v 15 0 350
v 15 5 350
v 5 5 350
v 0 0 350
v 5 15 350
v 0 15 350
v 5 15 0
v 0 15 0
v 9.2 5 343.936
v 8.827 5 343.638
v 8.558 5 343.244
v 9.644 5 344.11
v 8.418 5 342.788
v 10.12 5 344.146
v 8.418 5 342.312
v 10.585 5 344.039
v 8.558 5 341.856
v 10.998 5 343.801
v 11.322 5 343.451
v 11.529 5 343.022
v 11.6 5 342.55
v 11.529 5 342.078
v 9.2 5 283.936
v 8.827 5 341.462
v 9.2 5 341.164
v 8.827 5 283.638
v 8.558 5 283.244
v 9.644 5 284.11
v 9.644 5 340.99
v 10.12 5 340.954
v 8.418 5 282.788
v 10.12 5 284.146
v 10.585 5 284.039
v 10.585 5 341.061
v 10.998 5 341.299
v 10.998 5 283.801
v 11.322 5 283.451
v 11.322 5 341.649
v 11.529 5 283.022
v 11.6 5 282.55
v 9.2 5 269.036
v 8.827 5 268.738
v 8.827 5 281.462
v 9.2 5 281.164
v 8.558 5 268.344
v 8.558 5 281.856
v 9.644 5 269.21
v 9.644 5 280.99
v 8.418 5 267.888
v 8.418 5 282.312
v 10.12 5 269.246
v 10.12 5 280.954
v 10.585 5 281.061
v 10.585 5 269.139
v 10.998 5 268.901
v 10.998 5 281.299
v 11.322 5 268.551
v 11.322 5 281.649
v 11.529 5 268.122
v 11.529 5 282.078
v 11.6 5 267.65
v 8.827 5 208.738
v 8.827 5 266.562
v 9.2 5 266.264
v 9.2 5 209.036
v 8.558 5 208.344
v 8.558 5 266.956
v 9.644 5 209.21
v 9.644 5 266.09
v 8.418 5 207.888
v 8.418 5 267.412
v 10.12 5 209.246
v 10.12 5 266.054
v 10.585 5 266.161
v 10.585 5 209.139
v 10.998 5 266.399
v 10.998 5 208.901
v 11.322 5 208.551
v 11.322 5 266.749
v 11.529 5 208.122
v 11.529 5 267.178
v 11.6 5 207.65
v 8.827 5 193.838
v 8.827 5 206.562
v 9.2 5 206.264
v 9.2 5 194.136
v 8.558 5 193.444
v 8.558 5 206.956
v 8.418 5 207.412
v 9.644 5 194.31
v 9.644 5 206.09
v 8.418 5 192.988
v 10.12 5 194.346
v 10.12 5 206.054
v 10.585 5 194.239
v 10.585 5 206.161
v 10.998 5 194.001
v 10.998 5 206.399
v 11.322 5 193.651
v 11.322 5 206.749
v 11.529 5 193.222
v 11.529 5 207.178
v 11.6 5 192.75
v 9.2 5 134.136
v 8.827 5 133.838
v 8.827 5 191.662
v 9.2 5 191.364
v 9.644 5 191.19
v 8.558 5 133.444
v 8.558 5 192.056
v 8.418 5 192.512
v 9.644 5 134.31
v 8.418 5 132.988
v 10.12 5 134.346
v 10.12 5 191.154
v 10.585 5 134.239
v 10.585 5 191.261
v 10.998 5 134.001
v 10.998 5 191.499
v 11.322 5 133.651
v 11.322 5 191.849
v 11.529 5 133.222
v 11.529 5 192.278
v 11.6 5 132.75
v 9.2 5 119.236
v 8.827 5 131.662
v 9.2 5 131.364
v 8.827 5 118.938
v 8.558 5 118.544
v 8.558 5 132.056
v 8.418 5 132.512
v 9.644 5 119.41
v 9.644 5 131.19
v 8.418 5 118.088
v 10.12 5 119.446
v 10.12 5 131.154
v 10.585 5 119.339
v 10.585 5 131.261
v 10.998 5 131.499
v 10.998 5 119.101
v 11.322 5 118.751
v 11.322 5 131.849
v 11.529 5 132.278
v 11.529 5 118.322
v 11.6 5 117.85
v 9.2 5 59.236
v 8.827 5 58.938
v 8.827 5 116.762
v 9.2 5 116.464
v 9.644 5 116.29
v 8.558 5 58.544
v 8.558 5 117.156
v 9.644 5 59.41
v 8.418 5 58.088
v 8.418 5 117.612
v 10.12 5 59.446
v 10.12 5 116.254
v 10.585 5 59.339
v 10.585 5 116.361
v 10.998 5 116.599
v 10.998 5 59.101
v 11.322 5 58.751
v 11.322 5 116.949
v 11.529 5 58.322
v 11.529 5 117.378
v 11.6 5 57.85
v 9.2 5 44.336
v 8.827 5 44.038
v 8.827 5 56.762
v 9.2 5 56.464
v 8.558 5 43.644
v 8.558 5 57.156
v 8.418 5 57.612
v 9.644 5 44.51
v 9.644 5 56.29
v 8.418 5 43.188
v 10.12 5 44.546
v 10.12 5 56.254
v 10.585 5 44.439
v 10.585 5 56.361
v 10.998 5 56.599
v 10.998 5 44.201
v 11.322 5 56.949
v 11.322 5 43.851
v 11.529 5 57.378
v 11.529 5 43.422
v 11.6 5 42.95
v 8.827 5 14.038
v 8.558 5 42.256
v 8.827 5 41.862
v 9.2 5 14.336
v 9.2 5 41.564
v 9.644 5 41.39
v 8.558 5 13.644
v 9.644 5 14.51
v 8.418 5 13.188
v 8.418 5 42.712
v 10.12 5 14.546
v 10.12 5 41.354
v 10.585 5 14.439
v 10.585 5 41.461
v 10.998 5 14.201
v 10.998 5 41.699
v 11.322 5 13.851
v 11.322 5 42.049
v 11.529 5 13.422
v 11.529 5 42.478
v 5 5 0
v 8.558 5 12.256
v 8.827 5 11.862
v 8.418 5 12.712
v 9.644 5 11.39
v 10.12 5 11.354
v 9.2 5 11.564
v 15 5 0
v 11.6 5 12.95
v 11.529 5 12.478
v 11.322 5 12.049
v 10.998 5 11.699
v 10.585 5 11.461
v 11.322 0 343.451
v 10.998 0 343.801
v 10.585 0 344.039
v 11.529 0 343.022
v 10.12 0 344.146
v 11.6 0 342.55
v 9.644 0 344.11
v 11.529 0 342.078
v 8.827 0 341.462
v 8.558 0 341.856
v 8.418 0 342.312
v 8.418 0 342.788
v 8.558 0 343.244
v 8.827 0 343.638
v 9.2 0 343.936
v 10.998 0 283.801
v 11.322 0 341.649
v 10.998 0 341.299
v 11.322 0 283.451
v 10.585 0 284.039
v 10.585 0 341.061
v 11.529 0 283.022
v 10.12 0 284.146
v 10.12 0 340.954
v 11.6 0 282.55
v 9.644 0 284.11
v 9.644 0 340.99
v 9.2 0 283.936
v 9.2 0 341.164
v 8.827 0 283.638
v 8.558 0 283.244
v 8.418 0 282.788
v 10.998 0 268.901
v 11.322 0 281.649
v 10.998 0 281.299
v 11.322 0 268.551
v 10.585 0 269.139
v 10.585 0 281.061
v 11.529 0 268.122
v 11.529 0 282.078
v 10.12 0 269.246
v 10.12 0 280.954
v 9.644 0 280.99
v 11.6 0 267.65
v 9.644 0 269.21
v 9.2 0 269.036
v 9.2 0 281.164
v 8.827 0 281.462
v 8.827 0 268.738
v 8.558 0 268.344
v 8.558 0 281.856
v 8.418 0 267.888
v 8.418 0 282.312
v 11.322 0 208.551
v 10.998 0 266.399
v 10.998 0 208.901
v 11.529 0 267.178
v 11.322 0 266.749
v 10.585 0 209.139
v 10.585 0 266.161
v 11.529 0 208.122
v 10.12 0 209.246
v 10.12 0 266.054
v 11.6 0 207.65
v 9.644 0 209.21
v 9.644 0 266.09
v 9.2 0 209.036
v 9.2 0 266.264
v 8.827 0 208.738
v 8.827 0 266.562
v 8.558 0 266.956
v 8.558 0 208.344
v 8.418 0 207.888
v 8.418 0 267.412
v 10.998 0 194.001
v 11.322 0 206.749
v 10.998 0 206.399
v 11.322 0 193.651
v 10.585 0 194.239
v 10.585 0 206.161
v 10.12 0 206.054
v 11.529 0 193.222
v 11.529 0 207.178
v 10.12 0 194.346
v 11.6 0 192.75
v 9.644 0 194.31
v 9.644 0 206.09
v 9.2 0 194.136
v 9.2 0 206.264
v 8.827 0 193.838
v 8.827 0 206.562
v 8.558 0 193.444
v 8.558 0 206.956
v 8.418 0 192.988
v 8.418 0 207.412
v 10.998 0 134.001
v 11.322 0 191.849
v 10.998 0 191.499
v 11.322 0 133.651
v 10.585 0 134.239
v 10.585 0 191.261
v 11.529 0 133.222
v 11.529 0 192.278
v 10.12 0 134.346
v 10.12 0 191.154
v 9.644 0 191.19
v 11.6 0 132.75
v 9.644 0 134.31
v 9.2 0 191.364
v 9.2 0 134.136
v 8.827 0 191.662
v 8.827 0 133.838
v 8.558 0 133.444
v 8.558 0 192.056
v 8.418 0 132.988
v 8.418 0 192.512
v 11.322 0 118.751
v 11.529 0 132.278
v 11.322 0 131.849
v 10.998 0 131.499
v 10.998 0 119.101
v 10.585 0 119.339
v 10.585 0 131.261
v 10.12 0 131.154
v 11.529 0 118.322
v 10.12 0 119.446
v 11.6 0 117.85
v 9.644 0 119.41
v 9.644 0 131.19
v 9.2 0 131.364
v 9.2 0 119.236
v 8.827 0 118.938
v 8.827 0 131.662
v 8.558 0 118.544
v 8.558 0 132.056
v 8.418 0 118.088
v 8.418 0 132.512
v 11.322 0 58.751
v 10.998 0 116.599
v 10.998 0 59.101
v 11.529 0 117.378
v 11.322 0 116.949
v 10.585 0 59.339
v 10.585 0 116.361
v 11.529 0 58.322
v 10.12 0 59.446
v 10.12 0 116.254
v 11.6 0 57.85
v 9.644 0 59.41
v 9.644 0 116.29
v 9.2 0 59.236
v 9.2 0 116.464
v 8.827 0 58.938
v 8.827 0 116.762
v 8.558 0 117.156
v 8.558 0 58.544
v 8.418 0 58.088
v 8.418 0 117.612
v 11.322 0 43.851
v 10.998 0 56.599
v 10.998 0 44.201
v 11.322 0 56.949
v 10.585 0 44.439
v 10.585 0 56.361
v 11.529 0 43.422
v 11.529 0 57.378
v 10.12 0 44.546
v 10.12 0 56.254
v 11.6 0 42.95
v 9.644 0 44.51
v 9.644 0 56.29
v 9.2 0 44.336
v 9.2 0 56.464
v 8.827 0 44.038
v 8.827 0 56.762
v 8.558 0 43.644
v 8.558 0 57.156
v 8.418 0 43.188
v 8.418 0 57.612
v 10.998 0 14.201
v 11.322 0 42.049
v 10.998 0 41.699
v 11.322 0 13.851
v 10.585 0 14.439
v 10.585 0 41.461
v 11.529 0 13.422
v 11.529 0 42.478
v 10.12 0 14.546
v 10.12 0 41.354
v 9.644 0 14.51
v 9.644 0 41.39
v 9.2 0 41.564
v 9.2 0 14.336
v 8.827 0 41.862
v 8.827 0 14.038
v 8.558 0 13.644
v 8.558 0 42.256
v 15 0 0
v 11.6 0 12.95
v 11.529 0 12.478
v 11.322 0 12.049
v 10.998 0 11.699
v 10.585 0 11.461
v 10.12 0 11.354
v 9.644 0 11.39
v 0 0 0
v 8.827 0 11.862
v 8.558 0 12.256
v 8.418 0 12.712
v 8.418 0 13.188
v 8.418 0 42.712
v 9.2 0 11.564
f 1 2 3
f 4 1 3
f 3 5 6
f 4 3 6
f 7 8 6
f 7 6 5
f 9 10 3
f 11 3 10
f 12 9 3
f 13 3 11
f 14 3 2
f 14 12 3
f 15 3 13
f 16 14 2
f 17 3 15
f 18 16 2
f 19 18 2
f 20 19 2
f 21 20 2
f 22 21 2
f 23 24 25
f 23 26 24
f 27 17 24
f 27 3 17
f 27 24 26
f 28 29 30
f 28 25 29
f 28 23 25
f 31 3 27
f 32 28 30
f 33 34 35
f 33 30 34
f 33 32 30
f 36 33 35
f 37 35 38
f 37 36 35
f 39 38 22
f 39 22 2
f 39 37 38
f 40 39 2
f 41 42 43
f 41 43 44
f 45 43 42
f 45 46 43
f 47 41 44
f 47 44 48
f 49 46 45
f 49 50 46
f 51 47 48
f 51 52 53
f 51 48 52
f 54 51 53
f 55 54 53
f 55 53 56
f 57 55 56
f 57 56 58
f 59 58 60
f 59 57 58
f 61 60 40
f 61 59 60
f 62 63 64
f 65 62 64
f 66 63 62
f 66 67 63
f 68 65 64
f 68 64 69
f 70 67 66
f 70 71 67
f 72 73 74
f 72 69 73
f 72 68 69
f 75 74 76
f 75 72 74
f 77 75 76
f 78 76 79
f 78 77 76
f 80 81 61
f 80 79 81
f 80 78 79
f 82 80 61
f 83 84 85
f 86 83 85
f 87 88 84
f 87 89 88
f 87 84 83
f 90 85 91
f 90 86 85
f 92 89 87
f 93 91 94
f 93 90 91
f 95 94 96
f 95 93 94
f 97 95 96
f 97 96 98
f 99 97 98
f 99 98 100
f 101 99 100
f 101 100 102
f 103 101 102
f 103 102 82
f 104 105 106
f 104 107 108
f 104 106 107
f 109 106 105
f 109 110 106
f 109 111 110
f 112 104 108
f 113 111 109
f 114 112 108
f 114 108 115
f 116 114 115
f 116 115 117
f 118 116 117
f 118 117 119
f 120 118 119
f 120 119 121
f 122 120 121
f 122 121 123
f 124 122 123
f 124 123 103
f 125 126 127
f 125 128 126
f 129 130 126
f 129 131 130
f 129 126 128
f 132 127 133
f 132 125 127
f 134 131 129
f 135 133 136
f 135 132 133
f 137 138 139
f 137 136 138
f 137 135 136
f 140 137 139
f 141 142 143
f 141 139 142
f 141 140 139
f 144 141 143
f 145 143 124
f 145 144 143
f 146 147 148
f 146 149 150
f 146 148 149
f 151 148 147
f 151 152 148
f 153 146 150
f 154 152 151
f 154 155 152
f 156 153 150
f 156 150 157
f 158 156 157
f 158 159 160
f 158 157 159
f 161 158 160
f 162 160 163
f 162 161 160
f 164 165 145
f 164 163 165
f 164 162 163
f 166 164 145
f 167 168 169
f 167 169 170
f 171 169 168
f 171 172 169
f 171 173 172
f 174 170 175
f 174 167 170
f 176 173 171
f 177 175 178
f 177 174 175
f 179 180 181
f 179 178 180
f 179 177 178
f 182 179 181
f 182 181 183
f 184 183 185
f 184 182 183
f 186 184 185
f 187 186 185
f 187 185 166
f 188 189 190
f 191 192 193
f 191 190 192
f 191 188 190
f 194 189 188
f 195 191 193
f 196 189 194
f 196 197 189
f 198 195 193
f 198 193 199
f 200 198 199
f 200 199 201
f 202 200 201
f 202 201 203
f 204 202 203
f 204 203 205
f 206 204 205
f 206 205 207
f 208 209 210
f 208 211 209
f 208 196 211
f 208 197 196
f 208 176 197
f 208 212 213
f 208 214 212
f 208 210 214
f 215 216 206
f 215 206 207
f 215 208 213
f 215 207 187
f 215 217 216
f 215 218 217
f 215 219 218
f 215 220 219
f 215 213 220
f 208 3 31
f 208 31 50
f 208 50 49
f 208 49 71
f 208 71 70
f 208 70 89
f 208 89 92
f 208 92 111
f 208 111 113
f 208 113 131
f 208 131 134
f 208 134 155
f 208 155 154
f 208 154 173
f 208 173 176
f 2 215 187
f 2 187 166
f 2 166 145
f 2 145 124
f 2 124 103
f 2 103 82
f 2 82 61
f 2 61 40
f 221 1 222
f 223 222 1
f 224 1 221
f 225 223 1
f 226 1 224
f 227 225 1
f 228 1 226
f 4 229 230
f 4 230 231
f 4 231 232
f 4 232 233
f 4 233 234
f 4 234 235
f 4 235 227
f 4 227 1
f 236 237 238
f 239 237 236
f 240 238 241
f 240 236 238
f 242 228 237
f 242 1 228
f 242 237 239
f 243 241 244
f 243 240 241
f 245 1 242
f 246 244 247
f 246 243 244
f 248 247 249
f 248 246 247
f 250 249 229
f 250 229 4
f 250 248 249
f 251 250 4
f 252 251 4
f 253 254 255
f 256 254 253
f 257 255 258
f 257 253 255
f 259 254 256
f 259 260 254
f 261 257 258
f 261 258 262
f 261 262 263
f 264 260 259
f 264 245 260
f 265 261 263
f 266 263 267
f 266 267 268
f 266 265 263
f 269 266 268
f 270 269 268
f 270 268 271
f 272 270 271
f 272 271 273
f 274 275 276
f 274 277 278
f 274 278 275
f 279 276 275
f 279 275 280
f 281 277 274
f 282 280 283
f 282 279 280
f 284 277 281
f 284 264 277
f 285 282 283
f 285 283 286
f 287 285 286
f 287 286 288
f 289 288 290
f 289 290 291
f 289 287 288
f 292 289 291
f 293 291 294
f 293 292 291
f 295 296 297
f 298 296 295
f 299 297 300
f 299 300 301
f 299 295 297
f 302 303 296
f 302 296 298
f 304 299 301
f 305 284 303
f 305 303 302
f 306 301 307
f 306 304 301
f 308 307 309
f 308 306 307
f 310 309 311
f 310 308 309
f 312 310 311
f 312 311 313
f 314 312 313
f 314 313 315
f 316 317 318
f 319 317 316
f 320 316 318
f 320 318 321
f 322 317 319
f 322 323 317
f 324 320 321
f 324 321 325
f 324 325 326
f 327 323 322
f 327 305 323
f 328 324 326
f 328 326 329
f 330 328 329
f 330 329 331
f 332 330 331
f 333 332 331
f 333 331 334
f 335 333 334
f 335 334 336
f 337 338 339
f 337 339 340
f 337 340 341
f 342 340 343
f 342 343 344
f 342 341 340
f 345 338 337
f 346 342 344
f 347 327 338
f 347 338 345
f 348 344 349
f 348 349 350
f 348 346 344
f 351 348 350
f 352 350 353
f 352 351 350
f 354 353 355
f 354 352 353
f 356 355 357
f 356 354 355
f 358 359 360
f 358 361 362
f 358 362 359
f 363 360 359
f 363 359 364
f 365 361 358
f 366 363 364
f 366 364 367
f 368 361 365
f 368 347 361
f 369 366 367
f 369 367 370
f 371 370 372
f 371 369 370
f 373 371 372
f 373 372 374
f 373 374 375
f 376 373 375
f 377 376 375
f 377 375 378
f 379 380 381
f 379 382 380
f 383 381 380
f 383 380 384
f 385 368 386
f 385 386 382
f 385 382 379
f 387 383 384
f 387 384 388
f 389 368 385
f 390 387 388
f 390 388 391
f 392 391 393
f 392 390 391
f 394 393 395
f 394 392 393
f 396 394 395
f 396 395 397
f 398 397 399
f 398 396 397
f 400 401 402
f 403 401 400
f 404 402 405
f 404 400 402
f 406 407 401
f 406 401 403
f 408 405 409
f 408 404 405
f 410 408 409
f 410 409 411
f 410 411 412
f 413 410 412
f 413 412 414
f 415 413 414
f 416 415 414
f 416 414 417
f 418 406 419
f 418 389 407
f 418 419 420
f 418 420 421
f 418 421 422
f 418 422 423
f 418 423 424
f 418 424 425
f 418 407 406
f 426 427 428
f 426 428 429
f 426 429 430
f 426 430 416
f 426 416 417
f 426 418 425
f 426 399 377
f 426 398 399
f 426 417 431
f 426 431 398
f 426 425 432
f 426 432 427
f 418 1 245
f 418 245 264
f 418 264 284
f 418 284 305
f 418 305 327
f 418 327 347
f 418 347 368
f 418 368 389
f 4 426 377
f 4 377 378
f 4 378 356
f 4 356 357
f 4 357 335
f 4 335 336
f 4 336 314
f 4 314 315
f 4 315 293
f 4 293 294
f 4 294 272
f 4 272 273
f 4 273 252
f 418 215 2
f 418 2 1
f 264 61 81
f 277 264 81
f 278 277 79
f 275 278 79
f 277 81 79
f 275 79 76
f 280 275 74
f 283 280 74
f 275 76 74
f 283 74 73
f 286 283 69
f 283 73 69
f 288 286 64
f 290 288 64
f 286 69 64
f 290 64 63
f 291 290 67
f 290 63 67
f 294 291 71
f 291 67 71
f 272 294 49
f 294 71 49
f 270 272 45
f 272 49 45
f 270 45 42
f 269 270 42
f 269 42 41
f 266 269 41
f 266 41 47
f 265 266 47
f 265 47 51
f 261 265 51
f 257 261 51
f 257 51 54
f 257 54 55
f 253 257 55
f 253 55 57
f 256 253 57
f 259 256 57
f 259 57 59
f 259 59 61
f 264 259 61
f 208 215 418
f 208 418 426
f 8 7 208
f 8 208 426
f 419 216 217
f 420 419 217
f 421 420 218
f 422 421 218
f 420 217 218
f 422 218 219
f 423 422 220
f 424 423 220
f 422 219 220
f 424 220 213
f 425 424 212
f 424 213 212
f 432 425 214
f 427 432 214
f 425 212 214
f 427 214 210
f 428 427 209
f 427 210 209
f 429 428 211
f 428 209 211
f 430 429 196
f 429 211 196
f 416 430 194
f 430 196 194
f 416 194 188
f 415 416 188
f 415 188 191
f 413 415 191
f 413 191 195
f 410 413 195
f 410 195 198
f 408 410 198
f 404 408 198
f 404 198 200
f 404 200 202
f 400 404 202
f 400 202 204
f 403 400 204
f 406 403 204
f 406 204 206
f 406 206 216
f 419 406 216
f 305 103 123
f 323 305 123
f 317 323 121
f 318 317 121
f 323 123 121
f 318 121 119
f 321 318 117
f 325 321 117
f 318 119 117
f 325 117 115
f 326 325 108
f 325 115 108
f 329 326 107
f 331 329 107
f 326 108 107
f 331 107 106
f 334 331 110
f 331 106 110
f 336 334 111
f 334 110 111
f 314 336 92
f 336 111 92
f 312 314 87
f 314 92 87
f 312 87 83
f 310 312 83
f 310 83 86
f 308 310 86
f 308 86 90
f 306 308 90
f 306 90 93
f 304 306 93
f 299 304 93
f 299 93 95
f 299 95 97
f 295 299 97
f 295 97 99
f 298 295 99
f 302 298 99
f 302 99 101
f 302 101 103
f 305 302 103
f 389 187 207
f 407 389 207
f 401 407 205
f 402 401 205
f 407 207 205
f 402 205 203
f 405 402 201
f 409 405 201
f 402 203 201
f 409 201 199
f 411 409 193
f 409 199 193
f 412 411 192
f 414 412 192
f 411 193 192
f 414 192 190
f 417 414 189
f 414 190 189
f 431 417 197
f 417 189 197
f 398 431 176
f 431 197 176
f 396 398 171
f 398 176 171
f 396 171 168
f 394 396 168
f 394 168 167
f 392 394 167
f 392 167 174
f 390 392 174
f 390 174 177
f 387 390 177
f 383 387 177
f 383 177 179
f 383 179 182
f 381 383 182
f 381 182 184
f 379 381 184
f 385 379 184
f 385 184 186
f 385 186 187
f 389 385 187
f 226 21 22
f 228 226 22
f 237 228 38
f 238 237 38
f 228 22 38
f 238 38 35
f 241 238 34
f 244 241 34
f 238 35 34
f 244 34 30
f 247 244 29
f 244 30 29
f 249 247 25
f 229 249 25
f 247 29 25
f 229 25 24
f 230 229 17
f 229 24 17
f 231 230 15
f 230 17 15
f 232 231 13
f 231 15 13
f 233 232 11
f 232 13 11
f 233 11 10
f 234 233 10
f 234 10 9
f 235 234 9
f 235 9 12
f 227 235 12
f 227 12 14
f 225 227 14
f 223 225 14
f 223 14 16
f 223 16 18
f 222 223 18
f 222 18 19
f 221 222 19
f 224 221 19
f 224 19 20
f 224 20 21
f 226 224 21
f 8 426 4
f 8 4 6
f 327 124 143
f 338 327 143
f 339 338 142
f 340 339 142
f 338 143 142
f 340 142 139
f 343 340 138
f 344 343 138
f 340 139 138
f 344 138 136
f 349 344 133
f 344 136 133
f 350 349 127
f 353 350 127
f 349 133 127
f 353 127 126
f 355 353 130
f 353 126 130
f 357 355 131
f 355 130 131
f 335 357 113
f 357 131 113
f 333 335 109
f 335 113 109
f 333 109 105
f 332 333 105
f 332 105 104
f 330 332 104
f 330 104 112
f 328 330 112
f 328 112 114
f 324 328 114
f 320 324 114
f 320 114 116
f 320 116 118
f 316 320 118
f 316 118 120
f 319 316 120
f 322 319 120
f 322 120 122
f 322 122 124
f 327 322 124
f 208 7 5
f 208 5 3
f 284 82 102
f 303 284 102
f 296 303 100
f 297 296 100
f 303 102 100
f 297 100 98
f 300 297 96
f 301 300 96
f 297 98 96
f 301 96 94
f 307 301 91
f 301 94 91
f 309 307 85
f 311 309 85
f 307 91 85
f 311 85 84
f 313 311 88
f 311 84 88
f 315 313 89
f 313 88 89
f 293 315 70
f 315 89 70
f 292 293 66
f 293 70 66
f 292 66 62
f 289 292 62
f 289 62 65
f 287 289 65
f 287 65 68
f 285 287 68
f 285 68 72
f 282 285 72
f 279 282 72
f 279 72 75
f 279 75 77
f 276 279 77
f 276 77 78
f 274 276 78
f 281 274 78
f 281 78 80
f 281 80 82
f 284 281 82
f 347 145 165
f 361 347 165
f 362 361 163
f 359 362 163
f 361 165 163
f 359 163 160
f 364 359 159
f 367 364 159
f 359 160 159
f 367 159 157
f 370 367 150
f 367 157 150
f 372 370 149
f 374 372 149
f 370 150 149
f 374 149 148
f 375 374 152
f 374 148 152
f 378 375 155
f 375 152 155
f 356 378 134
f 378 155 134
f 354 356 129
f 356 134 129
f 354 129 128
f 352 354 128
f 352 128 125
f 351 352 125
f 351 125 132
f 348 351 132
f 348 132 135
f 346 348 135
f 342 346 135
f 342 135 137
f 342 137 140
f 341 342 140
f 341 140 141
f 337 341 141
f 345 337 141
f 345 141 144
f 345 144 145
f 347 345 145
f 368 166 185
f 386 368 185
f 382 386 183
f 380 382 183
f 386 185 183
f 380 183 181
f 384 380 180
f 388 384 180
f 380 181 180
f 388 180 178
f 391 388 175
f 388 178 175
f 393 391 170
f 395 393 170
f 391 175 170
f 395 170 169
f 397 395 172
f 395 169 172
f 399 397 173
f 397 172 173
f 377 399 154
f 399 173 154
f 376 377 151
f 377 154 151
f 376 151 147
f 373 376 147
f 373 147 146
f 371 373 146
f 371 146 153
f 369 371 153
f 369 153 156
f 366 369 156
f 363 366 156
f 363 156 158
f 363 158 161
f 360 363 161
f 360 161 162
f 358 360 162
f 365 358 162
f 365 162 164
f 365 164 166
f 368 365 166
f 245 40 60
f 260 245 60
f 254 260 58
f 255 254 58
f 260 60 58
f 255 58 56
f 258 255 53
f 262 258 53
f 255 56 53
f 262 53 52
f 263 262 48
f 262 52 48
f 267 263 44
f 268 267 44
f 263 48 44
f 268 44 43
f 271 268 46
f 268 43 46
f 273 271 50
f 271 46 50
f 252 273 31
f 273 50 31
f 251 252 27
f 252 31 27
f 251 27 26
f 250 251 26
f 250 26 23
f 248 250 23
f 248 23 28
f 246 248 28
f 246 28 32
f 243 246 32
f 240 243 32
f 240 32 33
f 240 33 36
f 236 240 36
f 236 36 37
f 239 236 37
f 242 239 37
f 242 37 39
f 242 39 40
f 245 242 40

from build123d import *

# Parameters (mm, degrees)
BOSS_EXTRUDE1_DEPTH                  = 350
F_3_2_3_2_DIAMETER_HOLE1_D           = 3.2
LPATTERN2_COUNT                      = 4
LPATTERN2_PITCH                      = 74.9
F_3_2_3_2_DIAMETERHOLEFORAHALFPART_D = 3.2


with BuildPart() as part:
    # Sketch1 → Boss-Extrude1 (new body)
    with BuildSketch(Plane.XY):
        Polygon((0, 0), (0, 15), (5, 15), (5, 5), (15, 5), (15, 0), align=None)
    extrude(amount=BOSS_EXTRUDE1_DEPTH)

    # Ø3.2 (3.2) Diameter Hole1 (through all)
    with Locations(Plane(origin=(0, 0, 0), x_dir=(-1, 0, 0), z_dir=(0, -1, 0))):
        with Locations((-10, -342.55), (-10, -282.55)):
            f_3_2_3_2_diameter_hole1 = Hole(F_3_2_3_2_DIAMETER_HOLE1_D / 2)

    # LPattern2: Ø3.2 (3.2) Diameter Hole1 ×4
    with Locations(*[(0, 0, -i * LPATTERN2_PITCH) for i in range(1, LPATTERN2_COUNT)]):
        add(f_3_2_3_2_diameter_hole1, mode=Mode.SUBTRACT)

    # Ø3.2 (3.2) DiameterHoleForAHalfPart (through all)
    with Locations(Plane(origin=(0, 0, 0), x_dir=(-1, 0, 0), z_dir=(0, -1, 0))):
        with Locations((-10, -42.95), (-10, -12.95)):
            Hole(F_3_2_3_2_DIAMETERHOLEFORAHALFPART_D / 2)


solid = part.part
